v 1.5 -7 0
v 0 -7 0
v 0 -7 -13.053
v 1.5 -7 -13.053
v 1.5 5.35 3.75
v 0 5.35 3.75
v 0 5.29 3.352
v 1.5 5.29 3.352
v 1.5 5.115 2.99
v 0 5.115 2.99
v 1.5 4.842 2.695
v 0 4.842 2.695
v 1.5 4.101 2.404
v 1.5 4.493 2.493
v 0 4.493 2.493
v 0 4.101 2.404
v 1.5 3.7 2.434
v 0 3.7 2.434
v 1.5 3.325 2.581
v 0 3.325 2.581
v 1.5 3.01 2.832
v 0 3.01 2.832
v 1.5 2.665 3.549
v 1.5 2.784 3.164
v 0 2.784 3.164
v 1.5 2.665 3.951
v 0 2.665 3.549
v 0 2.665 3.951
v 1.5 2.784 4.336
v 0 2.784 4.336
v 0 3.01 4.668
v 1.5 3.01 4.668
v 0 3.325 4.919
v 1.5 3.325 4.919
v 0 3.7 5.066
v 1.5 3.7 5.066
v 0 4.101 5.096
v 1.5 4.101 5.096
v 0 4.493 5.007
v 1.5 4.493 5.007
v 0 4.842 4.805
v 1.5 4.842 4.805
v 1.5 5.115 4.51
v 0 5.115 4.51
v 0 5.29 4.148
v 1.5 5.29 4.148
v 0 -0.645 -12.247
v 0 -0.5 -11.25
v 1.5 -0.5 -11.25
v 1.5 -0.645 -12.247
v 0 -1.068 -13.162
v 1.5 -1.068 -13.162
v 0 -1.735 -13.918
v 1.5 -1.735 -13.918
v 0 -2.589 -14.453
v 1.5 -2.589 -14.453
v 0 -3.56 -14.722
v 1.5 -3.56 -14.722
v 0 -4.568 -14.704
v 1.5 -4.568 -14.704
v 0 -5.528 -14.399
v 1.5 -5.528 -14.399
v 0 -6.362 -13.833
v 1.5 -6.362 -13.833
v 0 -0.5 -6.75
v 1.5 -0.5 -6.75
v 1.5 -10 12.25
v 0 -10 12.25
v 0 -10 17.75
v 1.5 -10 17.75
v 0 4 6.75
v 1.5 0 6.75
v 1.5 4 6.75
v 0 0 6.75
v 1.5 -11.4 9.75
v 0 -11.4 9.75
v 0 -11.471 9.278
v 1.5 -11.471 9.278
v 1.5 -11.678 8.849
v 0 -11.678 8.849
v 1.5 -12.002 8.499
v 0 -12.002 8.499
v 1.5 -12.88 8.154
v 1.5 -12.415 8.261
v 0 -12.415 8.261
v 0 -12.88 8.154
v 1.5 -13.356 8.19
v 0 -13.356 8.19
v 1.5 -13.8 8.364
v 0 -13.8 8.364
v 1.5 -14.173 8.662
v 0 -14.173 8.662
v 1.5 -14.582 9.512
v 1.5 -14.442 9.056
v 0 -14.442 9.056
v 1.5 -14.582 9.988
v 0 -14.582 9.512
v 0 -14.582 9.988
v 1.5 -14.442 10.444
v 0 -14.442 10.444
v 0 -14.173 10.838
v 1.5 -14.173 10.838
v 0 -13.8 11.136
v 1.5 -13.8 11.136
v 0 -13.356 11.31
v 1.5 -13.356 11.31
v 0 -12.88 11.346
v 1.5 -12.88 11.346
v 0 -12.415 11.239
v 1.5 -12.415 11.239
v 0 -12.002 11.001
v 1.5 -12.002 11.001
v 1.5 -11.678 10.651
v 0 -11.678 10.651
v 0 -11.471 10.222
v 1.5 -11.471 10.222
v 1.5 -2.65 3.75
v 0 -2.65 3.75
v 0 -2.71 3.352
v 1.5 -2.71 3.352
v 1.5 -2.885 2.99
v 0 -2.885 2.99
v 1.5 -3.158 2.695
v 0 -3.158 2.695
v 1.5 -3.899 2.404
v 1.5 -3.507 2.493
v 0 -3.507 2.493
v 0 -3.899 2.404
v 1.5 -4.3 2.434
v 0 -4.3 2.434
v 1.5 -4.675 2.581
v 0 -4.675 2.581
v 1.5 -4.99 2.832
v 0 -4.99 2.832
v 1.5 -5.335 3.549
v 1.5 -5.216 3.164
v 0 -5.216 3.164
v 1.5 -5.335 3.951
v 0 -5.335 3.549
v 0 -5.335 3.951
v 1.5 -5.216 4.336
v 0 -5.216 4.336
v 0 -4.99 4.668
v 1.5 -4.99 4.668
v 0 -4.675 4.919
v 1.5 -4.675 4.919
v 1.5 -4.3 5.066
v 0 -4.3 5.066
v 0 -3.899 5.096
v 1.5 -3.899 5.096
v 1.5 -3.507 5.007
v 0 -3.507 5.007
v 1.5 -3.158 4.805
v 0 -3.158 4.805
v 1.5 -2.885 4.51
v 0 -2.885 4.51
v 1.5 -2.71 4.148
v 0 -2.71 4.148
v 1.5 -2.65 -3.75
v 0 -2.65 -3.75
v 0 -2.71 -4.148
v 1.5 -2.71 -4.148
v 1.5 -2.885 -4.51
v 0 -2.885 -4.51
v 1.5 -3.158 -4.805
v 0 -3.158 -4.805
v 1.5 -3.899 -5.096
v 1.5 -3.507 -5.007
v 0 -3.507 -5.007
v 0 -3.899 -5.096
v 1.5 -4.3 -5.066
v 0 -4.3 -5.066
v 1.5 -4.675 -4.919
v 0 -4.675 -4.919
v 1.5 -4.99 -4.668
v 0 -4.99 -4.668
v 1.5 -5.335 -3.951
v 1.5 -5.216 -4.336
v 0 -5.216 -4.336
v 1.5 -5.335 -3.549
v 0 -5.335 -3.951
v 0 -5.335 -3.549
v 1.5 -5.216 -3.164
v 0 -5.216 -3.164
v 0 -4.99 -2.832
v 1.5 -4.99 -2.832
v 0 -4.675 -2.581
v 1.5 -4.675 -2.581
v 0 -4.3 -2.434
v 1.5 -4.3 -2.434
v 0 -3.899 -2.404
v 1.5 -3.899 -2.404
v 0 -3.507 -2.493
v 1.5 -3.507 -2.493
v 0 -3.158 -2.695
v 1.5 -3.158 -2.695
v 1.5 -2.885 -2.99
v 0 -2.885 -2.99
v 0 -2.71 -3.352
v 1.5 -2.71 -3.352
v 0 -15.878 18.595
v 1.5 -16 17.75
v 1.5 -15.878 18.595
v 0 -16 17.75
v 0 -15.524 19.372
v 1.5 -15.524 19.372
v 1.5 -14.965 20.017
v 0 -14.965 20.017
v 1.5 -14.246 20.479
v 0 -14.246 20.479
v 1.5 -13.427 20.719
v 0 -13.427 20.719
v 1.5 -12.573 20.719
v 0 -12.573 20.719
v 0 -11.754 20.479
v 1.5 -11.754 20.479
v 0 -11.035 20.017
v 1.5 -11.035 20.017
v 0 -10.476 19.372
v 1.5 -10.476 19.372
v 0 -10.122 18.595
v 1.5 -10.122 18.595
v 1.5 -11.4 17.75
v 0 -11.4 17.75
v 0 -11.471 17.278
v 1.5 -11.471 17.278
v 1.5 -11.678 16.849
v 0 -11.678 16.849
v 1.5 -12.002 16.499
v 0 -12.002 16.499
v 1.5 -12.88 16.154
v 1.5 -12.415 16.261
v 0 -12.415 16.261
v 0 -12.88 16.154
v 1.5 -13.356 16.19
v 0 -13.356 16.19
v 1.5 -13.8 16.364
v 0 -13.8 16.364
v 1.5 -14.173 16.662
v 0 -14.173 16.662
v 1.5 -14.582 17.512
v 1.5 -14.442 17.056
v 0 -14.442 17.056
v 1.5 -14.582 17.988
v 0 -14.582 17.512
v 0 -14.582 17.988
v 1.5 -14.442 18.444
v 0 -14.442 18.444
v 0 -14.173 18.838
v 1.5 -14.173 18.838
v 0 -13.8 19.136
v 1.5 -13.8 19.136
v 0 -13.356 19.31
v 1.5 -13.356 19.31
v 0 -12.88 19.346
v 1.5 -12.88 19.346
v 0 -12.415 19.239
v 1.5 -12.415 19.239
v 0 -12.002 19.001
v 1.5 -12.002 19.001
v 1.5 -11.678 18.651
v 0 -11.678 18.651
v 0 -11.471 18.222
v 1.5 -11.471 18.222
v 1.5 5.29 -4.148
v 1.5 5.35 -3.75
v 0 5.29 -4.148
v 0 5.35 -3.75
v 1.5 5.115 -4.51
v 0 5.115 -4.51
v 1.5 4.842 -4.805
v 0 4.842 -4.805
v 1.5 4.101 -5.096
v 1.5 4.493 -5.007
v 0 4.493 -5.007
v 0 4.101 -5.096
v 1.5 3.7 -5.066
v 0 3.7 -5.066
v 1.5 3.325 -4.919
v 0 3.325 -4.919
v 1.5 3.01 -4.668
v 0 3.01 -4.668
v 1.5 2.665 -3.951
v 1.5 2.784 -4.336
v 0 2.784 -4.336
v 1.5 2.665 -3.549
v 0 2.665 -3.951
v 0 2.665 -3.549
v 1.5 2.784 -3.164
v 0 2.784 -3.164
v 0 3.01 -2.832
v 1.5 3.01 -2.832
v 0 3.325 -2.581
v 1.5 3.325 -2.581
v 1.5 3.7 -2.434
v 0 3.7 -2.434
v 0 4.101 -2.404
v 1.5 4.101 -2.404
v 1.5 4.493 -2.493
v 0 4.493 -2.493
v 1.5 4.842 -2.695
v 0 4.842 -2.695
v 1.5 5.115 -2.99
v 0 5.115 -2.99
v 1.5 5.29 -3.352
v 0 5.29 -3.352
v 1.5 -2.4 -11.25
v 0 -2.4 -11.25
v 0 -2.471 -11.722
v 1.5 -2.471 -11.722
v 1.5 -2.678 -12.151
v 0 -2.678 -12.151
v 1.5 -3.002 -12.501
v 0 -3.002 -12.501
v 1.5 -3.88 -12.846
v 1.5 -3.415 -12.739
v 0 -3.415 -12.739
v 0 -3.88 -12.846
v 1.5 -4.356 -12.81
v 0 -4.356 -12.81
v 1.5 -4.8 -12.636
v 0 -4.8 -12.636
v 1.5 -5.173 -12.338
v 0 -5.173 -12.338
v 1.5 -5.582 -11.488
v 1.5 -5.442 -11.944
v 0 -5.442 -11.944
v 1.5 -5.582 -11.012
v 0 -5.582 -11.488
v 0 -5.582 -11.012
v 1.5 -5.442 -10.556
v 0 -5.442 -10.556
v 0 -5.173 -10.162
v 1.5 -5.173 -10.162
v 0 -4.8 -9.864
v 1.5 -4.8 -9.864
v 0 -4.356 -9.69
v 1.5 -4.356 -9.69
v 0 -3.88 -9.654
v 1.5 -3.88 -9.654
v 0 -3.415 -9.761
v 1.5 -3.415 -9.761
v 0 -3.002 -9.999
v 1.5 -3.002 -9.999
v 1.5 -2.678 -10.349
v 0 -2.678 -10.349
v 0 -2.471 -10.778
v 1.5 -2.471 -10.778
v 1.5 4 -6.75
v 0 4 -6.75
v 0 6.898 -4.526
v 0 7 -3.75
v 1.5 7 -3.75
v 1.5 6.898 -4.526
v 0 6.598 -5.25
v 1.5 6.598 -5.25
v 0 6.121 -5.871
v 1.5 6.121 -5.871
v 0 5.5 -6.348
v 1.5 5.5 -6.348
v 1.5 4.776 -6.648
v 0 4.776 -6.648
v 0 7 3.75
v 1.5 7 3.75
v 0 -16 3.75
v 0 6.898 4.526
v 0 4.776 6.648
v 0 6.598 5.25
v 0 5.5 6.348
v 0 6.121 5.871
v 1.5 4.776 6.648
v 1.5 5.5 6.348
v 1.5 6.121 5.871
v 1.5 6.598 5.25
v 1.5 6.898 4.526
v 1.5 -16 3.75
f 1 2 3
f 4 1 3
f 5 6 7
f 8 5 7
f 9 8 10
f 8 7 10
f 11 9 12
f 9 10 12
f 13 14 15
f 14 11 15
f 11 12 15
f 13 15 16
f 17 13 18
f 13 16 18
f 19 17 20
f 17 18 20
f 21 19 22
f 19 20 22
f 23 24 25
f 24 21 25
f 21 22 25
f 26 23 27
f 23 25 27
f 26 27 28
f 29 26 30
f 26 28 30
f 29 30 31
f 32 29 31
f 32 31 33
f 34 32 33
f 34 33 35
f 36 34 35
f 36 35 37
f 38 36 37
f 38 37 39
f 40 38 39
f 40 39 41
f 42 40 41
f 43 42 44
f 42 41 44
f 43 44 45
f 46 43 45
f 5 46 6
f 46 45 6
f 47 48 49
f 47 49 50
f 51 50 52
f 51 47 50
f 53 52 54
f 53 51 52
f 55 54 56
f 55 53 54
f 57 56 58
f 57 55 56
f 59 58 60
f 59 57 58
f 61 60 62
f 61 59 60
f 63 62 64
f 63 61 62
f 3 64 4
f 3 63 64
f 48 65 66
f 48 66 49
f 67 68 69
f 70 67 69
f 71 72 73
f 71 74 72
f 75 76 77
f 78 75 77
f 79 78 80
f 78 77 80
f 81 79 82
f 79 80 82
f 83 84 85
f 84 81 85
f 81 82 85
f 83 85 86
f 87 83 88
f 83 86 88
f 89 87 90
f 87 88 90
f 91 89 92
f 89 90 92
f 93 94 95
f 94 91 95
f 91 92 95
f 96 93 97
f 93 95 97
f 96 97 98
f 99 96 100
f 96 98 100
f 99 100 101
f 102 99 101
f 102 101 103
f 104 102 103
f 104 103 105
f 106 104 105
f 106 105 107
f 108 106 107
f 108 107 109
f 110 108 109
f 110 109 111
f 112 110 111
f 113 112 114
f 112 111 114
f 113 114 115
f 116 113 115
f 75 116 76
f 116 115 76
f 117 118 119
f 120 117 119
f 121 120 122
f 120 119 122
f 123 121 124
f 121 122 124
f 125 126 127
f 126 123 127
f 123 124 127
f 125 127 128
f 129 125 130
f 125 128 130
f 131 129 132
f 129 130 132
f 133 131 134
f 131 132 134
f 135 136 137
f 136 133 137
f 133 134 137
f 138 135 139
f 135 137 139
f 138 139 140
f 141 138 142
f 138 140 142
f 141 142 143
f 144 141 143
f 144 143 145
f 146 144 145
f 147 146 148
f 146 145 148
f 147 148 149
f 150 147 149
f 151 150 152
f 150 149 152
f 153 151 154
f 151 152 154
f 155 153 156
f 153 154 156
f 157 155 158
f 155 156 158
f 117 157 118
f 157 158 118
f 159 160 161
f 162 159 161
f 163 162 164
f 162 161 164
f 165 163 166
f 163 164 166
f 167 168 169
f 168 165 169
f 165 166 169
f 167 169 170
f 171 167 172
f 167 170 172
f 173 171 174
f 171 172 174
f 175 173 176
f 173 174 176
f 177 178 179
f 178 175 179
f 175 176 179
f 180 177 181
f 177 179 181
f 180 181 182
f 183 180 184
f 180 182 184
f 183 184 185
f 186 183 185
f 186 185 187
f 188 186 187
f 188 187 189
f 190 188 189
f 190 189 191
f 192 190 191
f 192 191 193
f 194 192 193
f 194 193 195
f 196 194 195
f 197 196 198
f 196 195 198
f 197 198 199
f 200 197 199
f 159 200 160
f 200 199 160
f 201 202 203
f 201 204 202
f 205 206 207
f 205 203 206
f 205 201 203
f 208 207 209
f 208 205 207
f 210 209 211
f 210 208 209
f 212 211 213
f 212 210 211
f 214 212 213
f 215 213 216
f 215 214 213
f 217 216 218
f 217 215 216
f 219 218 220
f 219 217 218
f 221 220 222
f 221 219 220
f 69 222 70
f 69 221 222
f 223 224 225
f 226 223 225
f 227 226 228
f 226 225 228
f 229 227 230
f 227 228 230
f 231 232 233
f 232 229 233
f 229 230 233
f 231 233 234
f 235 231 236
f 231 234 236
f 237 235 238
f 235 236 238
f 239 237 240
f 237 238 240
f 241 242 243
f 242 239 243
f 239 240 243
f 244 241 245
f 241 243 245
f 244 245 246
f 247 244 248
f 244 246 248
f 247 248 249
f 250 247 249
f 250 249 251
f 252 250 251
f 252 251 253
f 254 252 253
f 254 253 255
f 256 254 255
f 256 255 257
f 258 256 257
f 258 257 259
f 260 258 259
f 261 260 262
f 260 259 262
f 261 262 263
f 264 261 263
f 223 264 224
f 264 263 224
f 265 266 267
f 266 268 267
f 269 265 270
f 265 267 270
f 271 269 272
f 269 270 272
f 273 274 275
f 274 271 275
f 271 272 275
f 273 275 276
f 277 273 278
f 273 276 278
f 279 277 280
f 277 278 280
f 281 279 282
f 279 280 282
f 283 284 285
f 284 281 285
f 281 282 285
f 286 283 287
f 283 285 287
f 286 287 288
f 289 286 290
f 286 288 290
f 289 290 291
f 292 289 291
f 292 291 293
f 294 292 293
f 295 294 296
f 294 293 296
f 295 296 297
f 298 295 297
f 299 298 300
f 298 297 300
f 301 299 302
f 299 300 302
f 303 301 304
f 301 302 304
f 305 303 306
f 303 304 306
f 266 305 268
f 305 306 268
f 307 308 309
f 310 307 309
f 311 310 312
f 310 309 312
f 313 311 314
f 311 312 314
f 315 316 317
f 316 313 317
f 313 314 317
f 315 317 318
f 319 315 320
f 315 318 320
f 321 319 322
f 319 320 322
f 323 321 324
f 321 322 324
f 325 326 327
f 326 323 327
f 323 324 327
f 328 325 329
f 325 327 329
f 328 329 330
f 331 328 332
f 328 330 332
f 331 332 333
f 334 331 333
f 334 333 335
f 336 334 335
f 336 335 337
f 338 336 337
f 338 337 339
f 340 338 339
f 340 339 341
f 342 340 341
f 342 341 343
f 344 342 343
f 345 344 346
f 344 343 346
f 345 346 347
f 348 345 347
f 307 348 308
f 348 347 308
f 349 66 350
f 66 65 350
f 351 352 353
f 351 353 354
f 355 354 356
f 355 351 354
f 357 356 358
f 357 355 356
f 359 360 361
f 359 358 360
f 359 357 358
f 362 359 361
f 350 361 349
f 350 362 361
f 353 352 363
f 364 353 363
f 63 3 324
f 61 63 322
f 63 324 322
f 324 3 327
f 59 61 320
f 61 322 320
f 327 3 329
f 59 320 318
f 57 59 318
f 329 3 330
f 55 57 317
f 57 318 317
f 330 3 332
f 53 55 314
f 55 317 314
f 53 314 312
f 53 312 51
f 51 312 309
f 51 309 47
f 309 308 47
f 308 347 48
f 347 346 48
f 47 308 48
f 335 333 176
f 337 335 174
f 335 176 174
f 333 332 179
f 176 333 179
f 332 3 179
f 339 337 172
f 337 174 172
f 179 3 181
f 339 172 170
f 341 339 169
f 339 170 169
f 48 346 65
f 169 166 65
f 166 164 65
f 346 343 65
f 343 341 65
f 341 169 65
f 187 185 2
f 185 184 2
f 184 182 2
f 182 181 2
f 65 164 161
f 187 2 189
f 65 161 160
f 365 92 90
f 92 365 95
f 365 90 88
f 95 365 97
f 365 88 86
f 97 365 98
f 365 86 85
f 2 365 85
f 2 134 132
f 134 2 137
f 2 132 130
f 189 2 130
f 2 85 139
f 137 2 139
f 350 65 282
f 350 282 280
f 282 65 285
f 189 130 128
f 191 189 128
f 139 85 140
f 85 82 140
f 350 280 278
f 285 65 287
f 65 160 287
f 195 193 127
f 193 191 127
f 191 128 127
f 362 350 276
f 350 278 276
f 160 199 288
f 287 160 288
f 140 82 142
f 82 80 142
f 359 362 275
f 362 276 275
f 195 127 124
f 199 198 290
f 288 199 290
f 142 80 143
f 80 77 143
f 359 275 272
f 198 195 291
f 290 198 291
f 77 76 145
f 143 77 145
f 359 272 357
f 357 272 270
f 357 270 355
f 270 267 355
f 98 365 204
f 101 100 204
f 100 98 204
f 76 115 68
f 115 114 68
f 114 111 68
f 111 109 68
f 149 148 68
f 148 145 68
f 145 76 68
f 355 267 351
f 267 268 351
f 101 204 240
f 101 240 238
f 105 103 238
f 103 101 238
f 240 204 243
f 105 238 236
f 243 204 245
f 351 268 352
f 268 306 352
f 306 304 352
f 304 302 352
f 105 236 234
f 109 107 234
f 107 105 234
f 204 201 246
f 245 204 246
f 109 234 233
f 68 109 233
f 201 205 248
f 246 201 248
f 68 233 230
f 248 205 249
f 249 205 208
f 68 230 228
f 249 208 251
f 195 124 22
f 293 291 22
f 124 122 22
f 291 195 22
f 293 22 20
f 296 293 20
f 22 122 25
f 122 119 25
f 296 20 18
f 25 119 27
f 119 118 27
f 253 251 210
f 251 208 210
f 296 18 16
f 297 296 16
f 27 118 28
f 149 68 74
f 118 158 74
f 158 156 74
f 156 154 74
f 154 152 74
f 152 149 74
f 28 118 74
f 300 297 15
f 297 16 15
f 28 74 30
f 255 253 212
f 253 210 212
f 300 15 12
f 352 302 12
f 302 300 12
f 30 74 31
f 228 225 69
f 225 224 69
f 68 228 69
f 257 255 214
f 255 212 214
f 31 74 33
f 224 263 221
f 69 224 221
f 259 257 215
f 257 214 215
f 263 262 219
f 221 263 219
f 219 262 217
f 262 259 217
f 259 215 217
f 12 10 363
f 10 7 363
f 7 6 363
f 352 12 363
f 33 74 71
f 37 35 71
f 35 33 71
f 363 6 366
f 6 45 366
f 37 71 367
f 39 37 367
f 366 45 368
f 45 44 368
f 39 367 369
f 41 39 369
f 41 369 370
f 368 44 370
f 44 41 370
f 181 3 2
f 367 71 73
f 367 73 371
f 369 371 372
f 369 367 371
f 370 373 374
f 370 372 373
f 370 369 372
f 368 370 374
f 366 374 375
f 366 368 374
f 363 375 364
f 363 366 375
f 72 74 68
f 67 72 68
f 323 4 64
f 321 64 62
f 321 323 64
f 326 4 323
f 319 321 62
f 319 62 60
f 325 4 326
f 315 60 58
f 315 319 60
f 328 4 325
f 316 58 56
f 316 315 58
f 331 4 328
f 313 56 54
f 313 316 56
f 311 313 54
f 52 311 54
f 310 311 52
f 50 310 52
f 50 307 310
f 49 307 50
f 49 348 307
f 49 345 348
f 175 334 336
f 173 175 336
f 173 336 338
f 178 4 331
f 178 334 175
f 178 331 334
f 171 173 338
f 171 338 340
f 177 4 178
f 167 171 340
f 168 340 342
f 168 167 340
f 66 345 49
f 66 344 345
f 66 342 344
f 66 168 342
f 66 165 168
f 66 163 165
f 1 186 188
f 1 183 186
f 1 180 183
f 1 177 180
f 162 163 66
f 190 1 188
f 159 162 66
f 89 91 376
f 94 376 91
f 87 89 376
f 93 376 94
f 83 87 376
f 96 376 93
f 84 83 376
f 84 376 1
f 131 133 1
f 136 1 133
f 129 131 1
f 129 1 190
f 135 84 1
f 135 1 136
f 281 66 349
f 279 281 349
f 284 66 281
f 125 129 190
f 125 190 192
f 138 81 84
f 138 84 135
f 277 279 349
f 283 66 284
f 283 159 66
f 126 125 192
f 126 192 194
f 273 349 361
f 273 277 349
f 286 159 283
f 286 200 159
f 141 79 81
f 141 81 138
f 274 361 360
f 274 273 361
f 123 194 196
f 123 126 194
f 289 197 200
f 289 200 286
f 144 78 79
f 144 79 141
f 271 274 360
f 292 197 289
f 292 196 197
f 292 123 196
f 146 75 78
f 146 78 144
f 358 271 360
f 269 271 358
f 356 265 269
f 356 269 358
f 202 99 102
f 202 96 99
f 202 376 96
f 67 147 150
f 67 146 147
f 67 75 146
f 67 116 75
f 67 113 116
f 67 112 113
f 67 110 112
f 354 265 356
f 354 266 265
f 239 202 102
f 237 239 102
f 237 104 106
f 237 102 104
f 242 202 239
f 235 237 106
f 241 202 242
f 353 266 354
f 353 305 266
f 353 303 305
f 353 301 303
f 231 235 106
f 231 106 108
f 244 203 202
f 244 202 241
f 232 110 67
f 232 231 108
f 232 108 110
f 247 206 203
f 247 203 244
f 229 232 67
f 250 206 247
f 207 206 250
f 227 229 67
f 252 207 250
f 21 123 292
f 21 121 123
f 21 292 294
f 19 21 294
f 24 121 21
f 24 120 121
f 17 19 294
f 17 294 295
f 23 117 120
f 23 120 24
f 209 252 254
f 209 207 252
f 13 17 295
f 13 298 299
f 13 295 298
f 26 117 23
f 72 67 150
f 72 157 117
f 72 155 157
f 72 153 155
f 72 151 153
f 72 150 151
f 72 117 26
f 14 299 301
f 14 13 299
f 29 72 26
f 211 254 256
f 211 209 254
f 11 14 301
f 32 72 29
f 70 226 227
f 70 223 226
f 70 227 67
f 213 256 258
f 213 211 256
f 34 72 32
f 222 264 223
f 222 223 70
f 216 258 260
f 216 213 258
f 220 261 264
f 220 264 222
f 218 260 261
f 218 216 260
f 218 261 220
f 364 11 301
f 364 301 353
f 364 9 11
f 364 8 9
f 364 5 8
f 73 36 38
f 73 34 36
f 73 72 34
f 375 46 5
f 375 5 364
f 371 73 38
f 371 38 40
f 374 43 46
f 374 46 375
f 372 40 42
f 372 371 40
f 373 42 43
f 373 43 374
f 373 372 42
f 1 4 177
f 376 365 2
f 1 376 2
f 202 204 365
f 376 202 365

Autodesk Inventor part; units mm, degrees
ref_plane "YZ Plane" through (0, 0, 0) normal (1, 0, 0) x (0, 1, 0)
ref_plane "XZ Plane" through (0, 0, 0) normal (0, 1, 0) x (-1, 0, 0)
ref_plane "XY Plane" through (0, 0, 0) normal (0, 0, 1) x (1, 0, 0)
sketch "スケッチ1" plane through (0, 0, 0) normal (1, 0, 0) x (0, 1, 0)
  line L0 (7, 0) -> (-7, 0)
  line L1 (-7, 0) -> (-7, -6.75)
  line L2 (-7, -6.75) -> (7, -6.75)
  line L3 (7, -6.75) -> (7, 0)
  circle A0 centre (4, -3.75) radius 3
  circle A1 centre (-4, -3.75) radius 3
  line L4 (7, -0.75) -> (-7, -0.75)
  line L5 (-7, 0) -> (-7, 6.75)
  line L6 (-7, 6.75) -> (7, 6.75)
  line L7 (7, 6.75) -> (7, 0)
  circle A2 centre (4, 3.75) radius 3
  circle A3 centre (-4, 3.75) radius 3
  line L8 (7, 0.75) -> (-7, 0.75)
  circle A4 centre (4, -3.75) radius 1.35
  circle A5 centre (-4, -3.75) radius 1.35
  circle A6 centre (-4, 3.75) radius 1.35
  circle A7 centre (4, 3.75) radius 1.35
  line L9 (0, -21.85) -> (0, 27.85)
  line L10 (-10, 20.75) -> (-16, 20.75)
  line L11 (-16, 20.75) -> (-16, 3.75)
  line L12 (-16, 3.75) -> (-10, 3.75)
  line L13 (-10, 3.75) -> (-10, 20.75)
  circle A8 centre (-13, 17.75) radius 1.6
  circle A9 centre (-13, 9.75) radius 1.6
  circle A10 centre (-13, 17.75) radius 3
  line L14 (-7, -6.75) -> (-0.5, -6.75)
  line L15 (-0.5, -6.75) -> (-0.5, -14.75)
  line L16 (-0.5, -14.75) -> (-7, -14.75)
  line L17 (-7, -14.75) -> (-7, -6.75)
  circle A11 centre (-4, -11.25) radius 1.6
  circle A12 centre (-4, -11.25) radius 3.5
  line L18 (-16, 3.75) -> (-7, 0)
  line L19 (0, 6.75) -> (-10, 12.25)
  point P0 (0, 0)
  point P1 (0, 0)
  point P2 (-4.1535, 3.75)
  point P3 (7, -3.75)
  point P4 (7, 3.75)
  point P5 (-7, 3.75)
  point P6 (-7, -3.75)
  point P7 (4, 6.75)
  point P8 (-4, 6.75)
  point P9 (-16, 17.75)
  point P10 (-7, 6.75)
  point P11 (-5.3457, 6.75)
  point P12 (-10, 17.75)
  point P13 (2.4272, 6.3046)
  point P14 (-7, 3.75)
  point P15 (-7, -13.0528)
  point P16 (-0.5, -11.25)
  point P17 (4, -6.75)
  dimension "d0" = 14
  dimension "d1" = 6
  dimension "d2" = 6
  dimension "d3" = 0.75
  dimension "d5" = 2.7
  dimension "d12" = 6
  dimension "d13" = 3.2
  dimension "d14" = 3.2
  dimension "d15" = 3
  dimension "d16" = 8
  dimension "d17" = 3
  dimension "d19" = 3.2
  dimension "d20" = 8
  dimension "d21" = 3.5
  dimension "d22" = 3
extrude "プレート1" add sketch "スケッチ1" along normal blind 1.5 contours L3 L4 L9 L0 | L0 L9 L8 L7 | L9 L4 L1 L0 | L0 L5 L8 L9 | L3 A0 L4 | L8 A2 L7 | L18 L12 L13 L19 L6 L5 | L9 L2 A1 L4 | L4 A0 L2 L9 | L9 L6 A2 L8 | L8 A3 L6 L9 | A0 | A2 | L4 A1 L1 | L5 A3 L8 | L11 A10 L13 L12 | A1 | A3 | A1 L2 L1 | L5 L6 A3 | A10 | L15 A12 L17 L2 | A12 L17 picked at (-6.5333, -11.25)
equation "\"d17\" = 0.5 * d10"
equation "\"d6\" = Thickness"
equation "\"BendRadius\" = Thickness"
equation "\"BendReliefWidth\" = Thickness"
equation "\"BendReliefDepth\" = 0.5 * Thickness"
equation "\"CornerReliefSize\" = 4 * Thickness"
equation "\"MinimumRemnant\" = 2 * Thickness"
equation "\"TransitionRadius\" = BendRadius"
equation "\"JacobiRadiusSize\" = BendRadius"
equation "\"GapSize\" = Thickness"
equation "\"d10\" = 6"
equation "\"Thickness\" = 1.5"
properties part number "fork_outside" material "アルミニウム 6061"
